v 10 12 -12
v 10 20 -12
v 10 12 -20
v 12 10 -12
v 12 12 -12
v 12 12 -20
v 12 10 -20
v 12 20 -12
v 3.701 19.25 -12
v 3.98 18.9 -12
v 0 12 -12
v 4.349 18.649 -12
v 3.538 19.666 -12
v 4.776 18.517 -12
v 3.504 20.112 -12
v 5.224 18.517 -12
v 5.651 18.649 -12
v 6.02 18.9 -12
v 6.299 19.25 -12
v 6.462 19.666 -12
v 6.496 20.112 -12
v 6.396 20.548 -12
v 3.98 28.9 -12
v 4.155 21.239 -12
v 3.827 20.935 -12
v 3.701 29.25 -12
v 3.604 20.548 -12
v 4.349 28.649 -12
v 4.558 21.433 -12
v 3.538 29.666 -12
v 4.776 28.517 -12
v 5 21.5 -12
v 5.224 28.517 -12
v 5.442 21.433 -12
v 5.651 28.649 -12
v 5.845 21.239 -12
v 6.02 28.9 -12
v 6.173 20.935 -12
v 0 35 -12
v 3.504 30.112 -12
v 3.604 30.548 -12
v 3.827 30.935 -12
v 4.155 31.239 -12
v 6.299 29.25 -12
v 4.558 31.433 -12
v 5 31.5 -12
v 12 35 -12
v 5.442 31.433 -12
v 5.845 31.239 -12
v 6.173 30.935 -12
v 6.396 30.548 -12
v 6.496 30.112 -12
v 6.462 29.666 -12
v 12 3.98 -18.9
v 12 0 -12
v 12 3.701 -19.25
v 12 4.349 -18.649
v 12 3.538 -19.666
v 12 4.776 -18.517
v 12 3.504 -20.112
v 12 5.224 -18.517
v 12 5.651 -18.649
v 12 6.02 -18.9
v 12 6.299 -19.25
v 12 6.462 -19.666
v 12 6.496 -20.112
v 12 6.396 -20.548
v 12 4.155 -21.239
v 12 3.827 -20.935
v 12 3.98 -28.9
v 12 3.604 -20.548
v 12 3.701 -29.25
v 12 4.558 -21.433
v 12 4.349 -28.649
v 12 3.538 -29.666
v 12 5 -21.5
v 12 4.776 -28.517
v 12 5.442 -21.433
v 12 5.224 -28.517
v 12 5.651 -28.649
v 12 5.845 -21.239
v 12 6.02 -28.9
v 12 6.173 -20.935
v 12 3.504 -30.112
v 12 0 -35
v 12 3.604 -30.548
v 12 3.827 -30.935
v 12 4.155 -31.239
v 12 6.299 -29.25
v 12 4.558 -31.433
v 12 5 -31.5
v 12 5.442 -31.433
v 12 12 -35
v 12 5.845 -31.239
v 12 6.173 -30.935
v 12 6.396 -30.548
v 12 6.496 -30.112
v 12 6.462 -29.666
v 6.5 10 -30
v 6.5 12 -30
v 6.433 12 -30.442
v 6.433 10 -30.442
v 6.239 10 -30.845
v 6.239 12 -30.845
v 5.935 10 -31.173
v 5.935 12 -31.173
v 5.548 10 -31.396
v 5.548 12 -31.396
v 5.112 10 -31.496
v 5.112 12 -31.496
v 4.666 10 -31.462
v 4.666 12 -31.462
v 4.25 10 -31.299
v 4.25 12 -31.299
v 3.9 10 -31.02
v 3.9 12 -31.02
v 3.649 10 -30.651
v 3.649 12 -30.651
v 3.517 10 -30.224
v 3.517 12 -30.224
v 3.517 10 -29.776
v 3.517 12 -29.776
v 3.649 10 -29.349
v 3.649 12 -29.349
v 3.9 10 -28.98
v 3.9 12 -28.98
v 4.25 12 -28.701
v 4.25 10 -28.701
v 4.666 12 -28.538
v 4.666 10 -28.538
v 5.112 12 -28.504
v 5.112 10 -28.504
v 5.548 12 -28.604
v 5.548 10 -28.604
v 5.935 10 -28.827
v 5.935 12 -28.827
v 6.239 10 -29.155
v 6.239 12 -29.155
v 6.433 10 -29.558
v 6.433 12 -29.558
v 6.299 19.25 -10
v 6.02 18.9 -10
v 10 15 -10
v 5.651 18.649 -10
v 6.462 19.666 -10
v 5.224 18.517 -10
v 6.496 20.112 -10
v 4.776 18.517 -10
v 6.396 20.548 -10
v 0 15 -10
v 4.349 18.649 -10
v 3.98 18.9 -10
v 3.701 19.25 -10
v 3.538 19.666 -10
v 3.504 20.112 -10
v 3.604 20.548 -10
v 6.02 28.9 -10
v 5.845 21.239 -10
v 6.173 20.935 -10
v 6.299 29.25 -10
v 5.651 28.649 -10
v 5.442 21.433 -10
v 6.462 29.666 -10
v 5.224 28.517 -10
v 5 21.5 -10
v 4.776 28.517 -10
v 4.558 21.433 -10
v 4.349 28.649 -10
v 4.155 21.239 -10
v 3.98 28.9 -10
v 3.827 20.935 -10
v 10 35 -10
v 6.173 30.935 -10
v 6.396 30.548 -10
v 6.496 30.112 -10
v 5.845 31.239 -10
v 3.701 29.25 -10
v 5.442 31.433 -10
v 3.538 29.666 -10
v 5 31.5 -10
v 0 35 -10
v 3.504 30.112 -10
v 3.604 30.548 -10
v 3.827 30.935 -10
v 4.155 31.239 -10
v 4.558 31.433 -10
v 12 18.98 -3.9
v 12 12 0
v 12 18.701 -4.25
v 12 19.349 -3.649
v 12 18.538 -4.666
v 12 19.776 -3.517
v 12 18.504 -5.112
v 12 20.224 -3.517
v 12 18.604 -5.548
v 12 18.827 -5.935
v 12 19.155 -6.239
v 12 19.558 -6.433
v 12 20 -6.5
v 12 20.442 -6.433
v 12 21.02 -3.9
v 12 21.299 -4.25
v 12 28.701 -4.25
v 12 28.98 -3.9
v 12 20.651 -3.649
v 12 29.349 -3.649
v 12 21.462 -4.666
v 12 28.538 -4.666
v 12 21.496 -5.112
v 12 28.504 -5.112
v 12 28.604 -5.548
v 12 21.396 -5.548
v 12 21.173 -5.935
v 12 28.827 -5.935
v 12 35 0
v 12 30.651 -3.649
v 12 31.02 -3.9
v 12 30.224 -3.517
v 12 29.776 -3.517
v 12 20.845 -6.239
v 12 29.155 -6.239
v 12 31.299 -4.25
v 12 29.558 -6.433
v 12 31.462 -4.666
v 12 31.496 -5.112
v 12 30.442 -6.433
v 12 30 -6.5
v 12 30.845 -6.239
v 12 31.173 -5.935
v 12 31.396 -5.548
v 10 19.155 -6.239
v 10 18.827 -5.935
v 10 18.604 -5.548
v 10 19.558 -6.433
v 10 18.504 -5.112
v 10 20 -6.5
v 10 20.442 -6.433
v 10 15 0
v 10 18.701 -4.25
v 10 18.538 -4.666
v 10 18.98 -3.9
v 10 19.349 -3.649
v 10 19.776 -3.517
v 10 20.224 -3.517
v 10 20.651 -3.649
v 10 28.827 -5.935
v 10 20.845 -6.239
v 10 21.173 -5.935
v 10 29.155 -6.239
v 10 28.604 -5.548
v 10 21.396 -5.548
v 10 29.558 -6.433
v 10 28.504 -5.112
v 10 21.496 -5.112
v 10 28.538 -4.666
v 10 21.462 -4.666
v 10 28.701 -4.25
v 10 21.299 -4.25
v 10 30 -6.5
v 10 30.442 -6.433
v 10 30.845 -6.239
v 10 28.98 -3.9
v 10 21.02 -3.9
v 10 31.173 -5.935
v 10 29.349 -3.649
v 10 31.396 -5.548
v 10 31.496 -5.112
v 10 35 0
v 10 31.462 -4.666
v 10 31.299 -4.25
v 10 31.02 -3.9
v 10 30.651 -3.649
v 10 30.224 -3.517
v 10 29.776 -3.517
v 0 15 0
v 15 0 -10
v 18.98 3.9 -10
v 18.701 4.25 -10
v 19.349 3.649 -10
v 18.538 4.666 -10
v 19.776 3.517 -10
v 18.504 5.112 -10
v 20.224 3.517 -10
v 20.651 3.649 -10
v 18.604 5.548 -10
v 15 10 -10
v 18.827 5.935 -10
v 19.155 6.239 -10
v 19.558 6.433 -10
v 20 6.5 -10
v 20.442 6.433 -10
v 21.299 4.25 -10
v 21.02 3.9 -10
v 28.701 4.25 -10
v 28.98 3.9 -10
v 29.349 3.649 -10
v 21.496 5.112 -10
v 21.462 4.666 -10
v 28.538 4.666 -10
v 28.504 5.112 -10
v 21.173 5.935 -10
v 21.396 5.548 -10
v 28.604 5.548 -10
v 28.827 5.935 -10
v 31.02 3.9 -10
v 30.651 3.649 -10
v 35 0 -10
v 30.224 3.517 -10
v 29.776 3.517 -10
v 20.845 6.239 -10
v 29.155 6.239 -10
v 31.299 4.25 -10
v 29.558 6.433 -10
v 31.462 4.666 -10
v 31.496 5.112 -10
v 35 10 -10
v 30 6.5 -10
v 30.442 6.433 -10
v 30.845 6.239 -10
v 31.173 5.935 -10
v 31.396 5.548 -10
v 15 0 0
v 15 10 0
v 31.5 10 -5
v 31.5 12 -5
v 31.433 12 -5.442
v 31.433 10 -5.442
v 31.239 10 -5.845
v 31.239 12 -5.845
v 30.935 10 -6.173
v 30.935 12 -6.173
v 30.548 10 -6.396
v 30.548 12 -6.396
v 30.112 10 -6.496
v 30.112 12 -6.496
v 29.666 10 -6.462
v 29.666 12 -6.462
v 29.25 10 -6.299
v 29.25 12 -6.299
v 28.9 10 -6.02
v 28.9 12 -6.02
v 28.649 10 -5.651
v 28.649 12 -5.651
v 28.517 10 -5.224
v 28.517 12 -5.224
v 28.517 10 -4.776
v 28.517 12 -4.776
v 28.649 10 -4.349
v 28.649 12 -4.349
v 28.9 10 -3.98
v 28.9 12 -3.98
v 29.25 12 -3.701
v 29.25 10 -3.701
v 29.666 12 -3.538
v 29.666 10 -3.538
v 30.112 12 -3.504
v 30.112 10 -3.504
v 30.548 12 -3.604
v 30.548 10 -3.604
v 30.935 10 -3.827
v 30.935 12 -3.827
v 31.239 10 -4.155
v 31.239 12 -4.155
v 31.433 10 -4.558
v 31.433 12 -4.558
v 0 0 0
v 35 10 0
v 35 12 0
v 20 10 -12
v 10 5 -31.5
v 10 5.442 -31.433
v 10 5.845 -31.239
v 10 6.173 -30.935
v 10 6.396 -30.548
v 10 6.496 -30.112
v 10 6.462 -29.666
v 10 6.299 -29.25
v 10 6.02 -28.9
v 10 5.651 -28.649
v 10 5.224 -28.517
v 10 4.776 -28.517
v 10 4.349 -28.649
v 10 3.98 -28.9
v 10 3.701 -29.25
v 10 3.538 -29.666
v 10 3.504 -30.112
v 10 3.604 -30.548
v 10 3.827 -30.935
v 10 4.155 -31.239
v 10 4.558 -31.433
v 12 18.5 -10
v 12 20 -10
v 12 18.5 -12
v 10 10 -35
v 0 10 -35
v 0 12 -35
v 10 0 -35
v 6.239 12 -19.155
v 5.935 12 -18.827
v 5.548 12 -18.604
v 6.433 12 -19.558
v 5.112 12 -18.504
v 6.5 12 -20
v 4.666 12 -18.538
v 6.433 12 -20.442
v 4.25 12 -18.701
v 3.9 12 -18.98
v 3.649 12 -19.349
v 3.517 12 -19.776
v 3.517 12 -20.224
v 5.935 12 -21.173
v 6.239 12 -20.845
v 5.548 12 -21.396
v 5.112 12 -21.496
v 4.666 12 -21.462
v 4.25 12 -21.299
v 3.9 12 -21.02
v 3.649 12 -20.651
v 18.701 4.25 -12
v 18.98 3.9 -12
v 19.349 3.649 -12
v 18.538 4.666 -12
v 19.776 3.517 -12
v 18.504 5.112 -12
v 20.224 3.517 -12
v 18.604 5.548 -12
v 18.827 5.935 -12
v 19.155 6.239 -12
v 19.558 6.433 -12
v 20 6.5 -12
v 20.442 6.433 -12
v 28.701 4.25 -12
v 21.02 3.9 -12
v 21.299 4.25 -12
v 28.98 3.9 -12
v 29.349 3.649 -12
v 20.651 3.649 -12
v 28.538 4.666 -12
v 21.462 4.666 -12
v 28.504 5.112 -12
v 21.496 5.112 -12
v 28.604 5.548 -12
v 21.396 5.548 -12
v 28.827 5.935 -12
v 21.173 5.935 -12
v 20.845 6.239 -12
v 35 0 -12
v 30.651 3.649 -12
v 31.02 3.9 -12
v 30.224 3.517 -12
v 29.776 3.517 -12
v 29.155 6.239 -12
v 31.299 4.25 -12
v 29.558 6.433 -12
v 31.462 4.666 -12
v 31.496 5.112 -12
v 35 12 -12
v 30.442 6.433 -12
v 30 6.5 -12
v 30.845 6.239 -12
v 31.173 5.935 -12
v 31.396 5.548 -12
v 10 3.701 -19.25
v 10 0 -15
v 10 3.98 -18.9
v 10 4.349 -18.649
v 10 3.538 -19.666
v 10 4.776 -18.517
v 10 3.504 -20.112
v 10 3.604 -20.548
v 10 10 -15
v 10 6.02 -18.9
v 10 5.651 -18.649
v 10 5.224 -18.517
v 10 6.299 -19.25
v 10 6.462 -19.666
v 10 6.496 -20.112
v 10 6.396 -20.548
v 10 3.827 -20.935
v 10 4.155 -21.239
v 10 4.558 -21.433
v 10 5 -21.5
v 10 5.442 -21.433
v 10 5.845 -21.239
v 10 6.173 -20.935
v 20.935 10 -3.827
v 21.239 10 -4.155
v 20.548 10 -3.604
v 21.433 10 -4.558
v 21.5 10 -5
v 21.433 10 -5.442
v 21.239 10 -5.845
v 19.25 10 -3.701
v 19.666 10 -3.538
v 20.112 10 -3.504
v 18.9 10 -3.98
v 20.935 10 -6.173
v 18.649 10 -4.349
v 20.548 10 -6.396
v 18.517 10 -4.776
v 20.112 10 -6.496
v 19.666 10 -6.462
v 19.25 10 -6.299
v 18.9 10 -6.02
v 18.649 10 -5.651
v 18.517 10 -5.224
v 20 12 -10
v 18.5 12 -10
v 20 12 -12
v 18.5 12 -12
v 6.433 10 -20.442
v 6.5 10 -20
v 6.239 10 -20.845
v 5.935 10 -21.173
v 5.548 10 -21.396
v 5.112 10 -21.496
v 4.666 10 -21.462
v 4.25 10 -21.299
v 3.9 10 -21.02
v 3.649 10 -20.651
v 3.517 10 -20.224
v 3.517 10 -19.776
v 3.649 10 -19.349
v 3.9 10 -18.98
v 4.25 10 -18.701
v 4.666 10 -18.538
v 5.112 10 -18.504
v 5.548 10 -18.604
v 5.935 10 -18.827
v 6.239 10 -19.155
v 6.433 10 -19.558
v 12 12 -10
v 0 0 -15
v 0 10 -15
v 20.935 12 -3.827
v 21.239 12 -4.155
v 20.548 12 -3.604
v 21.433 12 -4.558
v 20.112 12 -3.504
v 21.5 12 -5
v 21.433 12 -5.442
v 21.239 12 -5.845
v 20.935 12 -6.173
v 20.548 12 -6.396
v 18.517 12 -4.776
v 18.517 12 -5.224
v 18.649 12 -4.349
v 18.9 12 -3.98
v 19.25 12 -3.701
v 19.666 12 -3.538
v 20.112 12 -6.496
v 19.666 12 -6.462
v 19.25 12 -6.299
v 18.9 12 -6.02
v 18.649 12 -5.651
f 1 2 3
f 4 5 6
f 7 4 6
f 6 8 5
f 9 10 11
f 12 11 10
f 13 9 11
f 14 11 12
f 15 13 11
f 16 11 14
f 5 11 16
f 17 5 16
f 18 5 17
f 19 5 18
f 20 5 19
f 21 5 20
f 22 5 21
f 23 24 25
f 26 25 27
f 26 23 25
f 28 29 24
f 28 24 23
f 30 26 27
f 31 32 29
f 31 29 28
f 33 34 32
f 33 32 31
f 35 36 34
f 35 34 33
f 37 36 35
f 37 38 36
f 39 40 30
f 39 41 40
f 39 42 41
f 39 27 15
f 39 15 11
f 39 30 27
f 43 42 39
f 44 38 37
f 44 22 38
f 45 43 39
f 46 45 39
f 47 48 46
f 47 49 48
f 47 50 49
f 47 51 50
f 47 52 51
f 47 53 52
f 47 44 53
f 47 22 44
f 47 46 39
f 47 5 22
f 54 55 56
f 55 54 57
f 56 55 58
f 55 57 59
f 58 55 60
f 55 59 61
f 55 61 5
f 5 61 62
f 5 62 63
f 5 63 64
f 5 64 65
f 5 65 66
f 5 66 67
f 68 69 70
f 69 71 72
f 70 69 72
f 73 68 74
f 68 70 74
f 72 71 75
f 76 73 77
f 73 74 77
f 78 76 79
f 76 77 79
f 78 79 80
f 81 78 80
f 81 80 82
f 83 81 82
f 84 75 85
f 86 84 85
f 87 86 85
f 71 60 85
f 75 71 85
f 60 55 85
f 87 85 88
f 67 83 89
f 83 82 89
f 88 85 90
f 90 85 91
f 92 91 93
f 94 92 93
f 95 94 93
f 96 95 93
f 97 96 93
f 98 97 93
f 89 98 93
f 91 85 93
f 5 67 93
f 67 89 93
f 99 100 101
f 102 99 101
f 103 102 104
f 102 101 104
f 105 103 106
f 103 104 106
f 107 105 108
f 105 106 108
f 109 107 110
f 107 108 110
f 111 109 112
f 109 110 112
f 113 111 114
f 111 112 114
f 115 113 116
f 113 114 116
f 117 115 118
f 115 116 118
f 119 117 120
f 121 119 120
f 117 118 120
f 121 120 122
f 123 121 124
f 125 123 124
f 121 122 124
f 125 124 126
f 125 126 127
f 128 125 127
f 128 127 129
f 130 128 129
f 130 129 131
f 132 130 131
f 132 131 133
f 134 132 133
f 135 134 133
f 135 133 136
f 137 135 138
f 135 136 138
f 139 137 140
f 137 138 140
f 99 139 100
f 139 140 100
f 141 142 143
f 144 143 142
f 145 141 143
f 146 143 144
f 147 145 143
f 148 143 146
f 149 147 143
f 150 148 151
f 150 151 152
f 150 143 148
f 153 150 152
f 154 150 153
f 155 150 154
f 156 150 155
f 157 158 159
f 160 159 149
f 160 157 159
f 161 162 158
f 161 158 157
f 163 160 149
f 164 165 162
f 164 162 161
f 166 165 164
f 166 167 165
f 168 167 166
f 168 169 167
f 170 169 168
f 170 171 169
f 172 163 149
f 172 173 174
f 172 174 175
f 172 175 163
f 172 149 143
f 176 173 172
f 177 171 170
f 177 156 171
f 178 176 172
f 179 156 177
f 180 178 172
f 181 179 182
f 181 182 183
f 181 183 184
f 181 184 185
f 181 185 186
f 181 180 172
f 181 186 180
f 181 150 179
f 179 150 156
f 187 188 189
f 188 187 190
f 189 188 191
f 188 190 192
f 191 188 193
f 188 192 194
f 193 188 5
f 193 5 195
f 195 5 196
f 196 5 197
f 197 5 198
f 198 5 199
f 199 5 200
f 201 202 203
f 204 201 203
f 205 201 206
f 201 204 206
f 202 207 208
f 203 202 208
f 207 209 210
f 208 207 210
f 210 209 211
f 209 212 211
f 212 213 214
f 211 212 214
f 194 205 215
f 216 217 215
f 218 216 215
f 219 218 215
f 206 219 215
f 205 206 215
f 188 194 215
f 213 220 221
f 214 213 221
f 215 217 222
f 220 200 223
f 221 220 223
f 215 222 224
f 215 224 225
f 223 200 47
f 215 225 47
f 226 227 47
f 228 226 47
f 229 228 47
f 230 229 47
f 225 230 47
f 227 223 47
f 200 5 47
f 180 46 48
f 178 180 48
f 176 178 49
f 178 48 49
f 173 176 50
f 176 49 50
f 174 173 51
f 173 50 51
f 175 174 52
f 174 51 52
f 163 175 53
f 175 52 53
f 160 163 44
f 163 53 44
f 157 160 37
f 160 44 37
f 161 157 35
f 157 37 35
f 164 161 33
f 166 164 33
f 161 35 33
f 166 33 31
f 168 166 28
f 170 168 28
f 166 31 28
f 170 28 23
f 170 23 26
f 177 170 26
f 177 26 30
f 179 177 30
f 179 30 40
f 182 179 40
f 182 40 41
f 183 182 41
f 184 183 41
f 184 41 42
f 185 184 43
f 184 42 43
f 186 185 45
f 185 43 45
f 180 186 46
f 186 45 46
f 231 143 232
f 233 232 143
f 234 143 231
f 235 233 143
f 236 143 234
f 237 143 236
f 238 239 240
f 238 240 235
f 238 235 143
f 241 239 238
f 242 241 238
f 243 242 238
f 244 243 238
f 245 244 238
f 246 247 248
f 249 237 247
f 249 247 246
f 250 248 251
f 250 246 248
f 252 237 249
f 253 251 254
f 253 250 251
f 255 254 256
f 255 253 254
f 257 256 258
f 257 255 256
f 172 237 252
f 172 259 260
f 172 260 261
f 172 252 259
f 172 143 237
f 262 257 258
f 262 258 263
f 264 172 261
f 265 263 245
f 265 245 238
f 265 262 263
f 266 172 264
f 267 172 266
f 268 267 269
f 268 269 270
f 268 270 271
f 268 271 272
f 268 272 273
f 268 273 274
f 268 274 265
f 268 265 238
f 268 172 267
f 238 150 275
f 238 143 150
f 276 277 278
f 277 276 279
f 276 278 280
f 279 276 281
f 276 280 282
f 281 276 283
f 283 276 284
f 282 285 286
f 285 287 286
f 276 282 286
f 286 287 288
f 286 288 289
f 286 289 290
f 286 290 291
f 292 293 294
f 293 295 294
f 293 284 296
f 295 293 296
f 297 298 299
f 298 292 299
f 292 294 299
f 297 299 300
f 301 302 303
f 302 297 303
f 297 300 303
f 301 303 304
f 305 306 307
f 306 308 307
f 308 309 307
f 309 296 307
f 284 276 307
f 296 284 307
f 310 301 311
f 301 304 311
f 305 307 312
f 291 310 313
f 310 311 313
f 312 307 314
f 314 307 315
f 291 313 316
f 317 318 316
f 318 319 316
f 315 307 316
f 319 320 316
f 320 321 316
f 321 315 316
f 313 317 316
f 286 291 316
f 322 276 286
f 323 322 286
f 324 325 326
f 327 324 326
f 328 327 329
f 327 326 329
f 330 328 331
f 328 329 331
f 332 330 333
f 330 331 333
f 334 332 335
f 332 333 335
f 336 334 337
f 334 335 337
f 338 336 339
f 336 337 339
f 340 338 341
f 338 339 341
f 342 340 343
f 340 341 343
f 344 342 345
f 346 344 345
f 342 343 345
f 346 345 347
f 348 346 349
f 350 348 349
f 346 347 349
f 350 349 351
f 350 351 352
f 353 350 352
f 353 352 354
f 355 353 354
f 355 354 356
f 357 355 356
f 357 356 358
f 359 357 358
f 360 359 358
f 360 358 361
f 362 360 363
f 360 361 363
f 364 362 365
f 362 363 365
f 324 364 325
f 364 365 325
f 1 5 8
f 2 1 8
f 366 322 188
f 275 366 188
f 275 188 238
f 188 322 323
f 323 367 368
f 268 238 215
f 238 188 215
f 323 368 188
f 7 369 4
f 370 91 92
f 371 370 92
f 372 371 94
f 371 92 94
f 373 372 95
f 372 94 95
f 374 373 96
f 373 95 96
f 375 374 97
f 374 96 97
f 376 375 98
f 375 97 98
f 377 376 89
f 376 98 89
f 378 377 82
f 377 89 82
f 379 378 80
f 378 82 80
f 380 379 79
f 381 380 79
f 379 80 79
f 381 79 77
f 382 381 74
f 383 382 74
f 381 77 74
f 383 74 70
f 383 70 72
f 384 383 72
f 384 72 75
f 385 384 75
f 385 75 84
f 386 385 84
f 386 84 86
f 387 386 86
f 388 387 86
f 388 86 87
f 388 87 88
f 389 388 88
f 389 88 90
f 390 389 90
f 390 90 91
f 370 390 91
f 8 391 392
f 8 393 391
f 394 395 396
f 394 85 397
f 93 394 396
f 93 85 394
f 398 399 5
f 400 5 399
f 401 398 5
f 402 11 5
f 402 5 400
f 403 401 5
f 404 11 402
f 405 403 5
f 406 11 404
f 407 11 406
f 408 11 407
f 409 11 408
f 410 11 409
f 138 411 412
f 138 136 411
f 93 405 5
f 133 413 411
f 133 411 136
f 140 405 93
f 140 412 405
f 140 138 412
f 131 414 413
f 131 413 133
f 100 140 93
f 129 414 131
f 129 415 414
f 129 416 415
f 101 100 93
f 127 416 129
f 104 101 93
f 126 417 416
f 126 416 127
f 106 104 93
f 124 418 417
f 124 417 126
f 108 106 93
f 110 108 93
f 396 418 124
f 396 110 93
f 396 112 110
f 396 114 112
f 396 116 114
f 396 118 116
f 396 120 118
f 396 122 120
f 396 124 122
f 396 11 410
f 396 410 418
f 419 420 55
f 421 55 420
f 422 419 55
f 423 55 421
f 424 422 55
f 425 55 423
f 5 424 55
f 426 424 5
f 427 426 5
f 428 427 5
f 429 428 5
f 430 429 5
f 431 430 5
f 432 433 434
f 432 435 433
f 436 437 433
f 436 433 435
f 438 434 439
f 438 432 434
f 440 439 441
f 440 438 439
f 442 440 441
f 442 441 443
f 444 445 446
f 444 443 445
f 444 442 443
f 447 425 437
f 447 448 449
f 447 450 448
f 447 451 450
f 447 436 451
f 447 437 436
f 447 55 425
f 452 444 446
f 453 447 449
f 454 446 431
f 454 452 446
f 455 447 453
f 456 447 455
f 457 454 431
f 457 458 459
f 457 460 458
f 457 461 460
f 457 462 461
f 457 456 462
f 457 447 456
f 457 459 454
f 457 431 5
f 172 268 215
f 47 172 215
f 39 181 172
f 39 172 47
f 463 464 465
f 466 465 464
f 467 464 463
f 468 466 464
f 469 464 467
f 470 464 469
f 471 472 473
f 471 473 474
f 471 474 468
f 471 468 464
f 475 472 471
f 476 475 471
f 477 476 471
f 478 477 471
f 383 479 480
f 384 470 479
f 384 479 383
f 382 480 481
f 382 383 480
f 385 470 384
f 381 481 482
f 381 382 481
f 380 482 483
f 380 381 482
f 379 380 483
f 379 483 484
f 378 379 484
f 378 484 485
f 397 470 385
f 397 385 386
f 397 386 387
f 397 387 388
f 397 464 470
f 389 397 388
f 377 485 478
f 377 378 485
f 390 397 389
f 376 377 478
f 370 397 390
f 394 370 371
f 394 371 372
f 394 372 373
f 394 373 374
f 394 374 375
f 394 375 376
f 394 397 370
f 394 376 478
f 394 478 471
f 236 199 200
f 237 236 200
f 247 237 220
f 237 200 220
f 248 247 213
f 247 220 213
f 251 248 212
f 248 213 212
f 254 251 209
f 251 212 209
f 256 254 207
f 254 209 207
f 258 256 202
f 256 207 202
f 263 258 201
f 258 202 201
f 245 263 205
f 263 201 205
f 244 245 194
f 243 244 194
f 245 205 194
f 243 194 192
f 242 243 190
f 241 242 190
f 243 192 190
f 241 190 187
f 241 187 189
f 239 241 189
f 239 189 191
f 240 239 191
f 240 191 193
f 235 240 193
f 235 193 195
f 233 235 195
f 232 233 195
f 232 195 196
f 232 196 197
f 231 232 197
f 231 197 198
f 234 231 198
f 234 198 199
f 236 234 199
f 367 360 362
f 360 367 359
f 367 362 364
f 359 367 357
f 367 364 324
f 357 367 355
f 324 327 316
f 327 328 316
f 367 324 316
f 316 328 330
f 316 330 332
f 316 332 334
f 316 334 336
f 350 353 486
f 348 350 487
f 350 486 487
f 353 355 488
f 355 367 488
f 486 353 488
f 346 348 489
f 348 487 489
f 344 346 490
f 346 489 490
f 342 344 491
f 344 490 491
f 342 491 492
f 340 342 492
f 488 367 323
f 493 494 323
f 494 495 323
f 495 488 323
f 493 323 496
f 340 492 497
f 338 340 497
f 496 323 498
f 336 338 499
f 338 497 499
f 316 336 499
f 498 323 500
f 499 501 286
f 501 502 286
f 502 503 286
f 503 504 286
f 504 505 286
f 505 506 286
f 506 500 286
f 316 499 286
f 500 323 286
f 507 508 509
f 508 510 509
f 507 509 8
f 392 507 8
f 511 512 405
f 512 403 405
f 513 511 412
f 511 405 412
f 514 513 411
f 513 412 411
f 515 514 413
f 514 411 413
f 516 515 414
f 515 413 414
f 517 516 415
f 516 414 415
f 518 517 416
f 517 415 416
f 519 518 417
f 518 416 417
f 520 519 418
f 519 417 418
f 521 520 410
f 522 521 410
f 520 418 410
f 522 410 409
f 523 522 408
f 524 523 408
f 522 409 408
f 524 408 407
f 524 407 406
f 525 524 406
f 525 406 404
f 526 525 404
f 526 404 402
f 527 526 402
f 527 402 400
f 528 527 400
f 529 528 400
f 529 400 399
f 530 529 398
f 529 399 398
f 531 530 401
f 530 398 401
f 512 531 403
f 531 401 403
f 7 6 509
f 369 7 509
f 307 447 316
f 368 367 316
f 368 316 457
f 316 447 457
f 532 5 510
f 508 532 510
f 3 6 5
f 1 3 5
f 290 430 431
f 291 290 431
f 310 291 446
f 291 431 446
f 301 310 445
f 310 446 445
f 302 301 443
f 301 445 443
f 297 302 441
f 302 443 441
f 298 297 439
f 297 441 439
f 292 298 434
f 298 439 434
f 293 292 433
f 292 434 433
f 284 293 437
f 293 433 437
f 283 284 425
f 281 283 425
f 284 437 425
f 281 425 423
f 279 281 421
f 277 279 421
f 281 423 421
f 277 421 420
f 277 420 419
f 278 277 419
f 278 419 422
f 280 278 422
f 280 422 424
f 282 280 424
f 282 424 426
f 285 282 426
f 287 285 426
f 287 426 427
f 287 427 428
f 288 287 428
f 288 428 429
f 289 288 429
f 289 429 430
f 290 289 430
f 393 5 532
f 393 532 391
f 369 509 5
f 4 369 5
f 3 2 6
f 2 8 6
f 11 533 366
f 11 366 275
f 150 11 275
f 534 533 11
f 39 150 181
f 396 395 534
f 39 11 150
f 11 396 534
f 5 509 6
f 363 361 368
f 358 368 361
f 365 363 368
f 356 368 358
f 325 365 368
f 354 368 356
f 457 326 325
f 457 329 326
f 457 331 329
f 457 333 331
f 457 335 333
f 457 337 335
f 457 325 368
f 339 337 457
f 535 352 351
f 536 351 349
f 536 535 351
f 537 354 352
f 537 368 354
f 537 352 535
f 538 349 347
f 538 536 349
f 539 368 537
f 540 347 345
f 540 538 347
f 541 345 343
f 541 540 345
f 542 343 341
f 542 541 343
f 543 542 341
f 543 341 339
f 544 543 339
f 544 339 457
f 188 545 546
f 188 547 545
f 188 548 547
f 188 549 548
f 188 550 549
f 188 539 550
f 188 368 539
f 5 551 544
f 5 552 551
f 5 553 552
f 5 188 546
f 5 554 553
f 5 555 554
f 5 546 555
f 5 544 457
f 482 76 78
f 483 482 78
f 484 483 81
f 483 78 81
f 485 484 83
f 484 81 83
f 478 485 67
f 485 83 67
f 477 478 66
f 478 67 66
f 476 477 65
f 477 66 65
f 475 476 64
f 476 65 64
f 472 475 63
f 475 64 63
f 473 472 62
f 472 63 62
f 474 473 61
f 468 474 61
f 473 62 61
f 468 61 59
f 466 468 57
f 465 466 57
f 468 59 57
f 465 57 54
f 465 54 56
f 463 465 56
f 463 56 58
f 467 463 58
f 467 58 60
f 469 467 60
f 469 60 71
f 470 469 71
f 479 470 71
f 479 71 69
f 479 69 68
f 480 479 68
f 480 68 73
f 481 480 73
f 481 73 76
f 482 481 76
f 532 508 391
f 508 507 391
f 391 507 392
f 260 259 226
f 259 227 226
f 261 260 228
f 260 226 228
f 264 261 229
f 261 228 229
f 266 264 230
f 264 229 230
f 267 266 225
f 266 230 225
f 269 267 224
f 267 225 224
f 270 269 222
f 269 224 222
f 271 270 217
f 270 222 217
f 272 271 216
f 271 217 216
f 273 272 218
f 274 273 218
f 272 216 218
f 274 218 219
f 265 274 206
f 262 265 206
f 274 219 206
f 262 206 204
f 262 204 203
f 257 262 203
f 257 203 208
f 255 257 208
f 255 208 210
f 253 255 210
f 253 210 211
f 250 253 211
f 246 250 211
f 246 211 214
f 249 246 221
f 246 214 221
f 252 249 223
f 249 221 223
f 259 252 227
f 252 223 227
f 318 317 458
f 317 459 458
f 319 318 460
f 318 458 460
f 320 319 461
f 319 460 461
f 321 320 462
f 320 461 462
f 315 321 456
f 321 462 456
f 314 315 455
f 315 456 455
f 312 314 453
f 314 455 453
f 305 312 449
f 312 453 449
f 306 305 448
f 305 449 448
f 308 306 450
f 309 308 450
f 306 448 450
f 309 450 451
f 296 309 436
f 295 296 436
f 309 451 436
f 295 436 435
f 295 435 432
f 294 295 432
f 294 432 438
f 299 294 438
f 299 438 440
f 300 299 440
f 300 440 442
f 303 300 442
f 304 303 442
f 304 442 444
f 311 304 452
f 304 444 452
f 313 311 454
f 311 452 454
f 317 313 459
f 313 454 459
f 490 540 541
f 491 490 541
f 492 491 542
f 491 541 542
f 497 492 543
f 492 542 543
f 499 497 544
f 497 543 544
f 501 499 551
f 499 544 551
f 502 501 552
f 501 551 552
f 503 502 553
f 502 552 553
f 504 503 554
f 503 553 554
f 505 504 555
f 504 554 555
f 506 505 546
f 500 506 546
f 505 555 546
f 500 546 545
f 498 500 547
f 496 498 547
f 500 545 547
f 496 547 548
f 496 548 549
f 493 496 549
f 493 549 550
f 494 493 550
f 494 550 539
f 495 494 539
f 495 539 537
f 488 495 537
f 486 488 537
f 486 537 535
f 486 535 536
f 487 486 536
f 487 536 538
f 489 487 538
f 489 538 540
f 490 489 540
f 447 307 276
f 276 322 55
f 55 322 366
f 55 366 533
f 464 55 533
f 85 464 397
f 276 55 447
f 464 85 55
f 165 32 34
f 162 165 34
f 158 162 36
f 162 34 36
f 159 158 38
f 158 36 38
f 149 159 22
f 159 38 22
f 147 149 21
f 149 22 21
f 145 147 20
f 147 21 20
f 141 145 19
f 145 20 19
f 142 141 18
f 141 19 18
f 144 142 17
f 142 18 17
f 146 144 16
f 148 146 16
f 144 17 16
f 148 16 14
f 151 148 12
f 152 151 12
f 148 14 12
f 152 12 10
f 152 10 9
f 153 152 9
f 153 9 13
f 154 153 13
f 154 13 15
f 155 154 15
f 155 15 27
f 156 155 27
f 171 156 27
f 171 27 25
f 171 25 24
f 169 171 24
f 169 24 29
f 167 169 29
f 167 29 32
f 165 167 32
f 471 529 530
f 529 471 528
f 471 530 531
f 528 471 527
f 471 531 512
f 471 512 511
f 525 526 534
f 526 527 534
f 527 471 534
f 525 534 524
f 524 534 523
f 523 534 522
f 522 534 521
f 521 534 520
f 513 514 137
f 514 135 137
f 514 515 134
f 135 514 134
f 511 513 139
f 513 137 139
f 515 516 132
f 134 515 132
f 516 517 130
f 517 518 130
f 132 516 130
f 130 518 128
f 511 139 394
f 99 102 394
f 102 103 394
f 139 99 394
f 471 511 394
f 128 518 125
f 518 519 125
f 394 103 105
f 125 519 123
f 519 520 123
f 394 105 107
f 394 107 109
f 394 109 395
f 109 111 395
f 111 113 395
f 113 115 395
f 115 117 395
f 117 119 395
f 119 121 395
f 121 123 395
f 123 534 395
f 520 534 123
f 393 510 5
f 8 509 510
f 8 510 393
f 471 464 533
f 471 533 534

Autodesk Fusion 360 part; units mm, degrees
box "BoxPrimitive1" add length 35 width 12 height 12 placed x (0, 0, -1) y (-1, 0, 0) z (0, 1, 0) at (12, 0, 0) makes body 1
box "BoxPrimitive2" add length 12 width 35 height 12 placed x (0, 0, -1) y (-1, 0, 0) z (0, 1, 0) at (35, 0, 0) bodies 1
box "BoxPrimitive3" add length 12 width 12 height 35 placed x (0, 0, -1) y (-1, 0, 0) z (0, 1, 0) at (12, 0, 0) bodies 1
cylinder "CylinderPrimitive1" cut diameter 3 height 15 placed x (1, 0, 0) y (0, 0, -1) z (0, 1, 0) at (30, 0, -5) bodies 1
cylinder "CylinderPrimitive2" cut diameter 3 height 15 placed x (1, 0, 0) y (0, 0, -1) z (0, 1, 0) at (20, 0, -5) bodies 1
cylinder "CylinderPrimitive3" cut diameter 3 height 15 placed x (1, 0, 0) y (0, 0, -1) z (0, 1, 0) at (5, 0, -30) bodies 1
cylinder "CylinderPrimitive4" cut diameter 3 height 15 placed x (1, 0, 0) y (0, 0, -1) z (0, 1, 0) at (5, 0, -20) bodies 1
cylinder "CylinderPrimitive5" cut diameter 3 height 15 placed x (0, 0, -1) y (0, 1, 0) z (1, 0, 0) at (0, 5, -30) bodies 1
cylinder "CylinderPrimitive6" cut diameter 3 height 15 placed x (0, 0, -1) y (0, 1, 0) z (1, 0, 0) at (0, 5, -20) bodies 1
cylinder "CylinderPrimitive7" cut diameter 3 height -15 placed x (0, 1, 0) y (1, 0, 0) z (0, 0, -1) at (30, 5, -12) bodies 1
cylinder "CylinderPrimitive8" cut diameter 3 height -15 placed x (0, 1, 0) y (1, 0, 0) z (0, 0, -1) at (20, 5, -12) bodies 1
cylinder "CylinderPrimitive9" cut diameter 3 height -15 placed x (0, 0, -1) y (0, 1, 0) z (1, 0, 0) at (12, 30, -5) bodies 1
cylinder "CylinderPrimitive10" cut diameter 3 height -15 placed x (0, 0, -1) y (0, 1, 0) z (1, 0, 0) at (12, 20, -5) bodies 1
cylinder "CylinderPrimitive11" cut diameter 3 height -15 placed x (0, 1, 0) y (1, 0, 0) z (0, 0, -1) at (5, 30, -12) bodies 1
cylinder "CylinderPrimitive12" cut diameter 3 height -15 placed x (0, 1, 0) y (1, 0, 0) z (0, 0, -1) at (5, 20, -12) bodies 1
sketch "Sketch24" plane through (0, 0, -12) normal (0, 0, -1) x (-1, 0, 0)
  circle A0 centre (-20, 5) radius 1.5
  circle A1 centre (-30, 5) radius 1.5
  line L0 (-12, 0) -> (-12, 12)
  line L1 (-12, 12) -> (-35, 12)
  line L2 (-35, 12) -> (-35, 0)
  line L3 (-35, 0) -> (-12, 0)
  line L4 (-21.5, 12) -> (-18.5, 12)
  line L5 (-12, 18.5) -> (-12, 21.5)
  line L6 (-20, 12) -> (-12, 20)
  line L7 (-12, 12) -> (-12, 20)
extrude "Extrude5" add sketch "Sketch24" against normal blind 2 separate body contours L1 L4 L5 L6 L7 makes body 2
sketch "Sketch25" plane through (12, 0, 0) normal (1, 0, 0) x (0, 0, -1)
  circle A0 centre (20, 5) radius 1.5
  circle A1 centre (30, 5) radius 1.5
  line L0 (12, 12) -> (12, 0)
  line L1 (12, 0) -> (35, 0)
  line L2 (35, 0) -> (35, 12)
  line L3 (35, 12) -> (12, 12)
  line L4 (12, 20) -> (20, 12)
  line L5 (12, 12) -> (12, 20)
  point P0 (12, 20)
  point P1 (20, 12)
extrude "Extrude6" add sketch "Sketch25" against normal blind 2 separate body contours L3 L4 L5 makes body 3
sketch "Sketch26" plane through (0, 12, 0) normal (0, 1, 0) x (-1, 0, 0)
  circle A0 centre (-5, -20) radius 1.5
  circle A1 centre (-5, -30) radius 1.5
  line L0 (0, -12) -> (-12, -12)
  line L1 (-12, -12) -> (-12, -35)
  line L2 (-12, -35) -> (0, -35)
  line L3 (0, -35) -> (0, -12)
  line L4 (-12, -20) -> (-20, -12)
  line L5 (-20, -12) -> (-12, -12)
  point P0 (-12, -20)
  point P1 (-20, -12)
extrude "Extrude7" add sketch "Sketch26" against normal blind 2 separate body contours L1 L4 L5 makes body 4
box "BoxPrimitive7" cut length 10 width 25 height 10 placed x (0, 0, -1) y (-1, 0, 0) z (0, 1, 0) at (40, 0, 0) bodies 1
box "BoxPrimitive8" cut length 25 width 10 height 10 placed x (0, 0, -1) y (-1, 0, 0) z (0, 1, 0) at (10, 0, -15) bodies 1
box "BoxPrimitive9" cut length 25 width 10 height -10 placed x (0, 1, 0) y (-1, 0, 0) z (0, 0, 1) at (10, 15, 0) bodies 1
